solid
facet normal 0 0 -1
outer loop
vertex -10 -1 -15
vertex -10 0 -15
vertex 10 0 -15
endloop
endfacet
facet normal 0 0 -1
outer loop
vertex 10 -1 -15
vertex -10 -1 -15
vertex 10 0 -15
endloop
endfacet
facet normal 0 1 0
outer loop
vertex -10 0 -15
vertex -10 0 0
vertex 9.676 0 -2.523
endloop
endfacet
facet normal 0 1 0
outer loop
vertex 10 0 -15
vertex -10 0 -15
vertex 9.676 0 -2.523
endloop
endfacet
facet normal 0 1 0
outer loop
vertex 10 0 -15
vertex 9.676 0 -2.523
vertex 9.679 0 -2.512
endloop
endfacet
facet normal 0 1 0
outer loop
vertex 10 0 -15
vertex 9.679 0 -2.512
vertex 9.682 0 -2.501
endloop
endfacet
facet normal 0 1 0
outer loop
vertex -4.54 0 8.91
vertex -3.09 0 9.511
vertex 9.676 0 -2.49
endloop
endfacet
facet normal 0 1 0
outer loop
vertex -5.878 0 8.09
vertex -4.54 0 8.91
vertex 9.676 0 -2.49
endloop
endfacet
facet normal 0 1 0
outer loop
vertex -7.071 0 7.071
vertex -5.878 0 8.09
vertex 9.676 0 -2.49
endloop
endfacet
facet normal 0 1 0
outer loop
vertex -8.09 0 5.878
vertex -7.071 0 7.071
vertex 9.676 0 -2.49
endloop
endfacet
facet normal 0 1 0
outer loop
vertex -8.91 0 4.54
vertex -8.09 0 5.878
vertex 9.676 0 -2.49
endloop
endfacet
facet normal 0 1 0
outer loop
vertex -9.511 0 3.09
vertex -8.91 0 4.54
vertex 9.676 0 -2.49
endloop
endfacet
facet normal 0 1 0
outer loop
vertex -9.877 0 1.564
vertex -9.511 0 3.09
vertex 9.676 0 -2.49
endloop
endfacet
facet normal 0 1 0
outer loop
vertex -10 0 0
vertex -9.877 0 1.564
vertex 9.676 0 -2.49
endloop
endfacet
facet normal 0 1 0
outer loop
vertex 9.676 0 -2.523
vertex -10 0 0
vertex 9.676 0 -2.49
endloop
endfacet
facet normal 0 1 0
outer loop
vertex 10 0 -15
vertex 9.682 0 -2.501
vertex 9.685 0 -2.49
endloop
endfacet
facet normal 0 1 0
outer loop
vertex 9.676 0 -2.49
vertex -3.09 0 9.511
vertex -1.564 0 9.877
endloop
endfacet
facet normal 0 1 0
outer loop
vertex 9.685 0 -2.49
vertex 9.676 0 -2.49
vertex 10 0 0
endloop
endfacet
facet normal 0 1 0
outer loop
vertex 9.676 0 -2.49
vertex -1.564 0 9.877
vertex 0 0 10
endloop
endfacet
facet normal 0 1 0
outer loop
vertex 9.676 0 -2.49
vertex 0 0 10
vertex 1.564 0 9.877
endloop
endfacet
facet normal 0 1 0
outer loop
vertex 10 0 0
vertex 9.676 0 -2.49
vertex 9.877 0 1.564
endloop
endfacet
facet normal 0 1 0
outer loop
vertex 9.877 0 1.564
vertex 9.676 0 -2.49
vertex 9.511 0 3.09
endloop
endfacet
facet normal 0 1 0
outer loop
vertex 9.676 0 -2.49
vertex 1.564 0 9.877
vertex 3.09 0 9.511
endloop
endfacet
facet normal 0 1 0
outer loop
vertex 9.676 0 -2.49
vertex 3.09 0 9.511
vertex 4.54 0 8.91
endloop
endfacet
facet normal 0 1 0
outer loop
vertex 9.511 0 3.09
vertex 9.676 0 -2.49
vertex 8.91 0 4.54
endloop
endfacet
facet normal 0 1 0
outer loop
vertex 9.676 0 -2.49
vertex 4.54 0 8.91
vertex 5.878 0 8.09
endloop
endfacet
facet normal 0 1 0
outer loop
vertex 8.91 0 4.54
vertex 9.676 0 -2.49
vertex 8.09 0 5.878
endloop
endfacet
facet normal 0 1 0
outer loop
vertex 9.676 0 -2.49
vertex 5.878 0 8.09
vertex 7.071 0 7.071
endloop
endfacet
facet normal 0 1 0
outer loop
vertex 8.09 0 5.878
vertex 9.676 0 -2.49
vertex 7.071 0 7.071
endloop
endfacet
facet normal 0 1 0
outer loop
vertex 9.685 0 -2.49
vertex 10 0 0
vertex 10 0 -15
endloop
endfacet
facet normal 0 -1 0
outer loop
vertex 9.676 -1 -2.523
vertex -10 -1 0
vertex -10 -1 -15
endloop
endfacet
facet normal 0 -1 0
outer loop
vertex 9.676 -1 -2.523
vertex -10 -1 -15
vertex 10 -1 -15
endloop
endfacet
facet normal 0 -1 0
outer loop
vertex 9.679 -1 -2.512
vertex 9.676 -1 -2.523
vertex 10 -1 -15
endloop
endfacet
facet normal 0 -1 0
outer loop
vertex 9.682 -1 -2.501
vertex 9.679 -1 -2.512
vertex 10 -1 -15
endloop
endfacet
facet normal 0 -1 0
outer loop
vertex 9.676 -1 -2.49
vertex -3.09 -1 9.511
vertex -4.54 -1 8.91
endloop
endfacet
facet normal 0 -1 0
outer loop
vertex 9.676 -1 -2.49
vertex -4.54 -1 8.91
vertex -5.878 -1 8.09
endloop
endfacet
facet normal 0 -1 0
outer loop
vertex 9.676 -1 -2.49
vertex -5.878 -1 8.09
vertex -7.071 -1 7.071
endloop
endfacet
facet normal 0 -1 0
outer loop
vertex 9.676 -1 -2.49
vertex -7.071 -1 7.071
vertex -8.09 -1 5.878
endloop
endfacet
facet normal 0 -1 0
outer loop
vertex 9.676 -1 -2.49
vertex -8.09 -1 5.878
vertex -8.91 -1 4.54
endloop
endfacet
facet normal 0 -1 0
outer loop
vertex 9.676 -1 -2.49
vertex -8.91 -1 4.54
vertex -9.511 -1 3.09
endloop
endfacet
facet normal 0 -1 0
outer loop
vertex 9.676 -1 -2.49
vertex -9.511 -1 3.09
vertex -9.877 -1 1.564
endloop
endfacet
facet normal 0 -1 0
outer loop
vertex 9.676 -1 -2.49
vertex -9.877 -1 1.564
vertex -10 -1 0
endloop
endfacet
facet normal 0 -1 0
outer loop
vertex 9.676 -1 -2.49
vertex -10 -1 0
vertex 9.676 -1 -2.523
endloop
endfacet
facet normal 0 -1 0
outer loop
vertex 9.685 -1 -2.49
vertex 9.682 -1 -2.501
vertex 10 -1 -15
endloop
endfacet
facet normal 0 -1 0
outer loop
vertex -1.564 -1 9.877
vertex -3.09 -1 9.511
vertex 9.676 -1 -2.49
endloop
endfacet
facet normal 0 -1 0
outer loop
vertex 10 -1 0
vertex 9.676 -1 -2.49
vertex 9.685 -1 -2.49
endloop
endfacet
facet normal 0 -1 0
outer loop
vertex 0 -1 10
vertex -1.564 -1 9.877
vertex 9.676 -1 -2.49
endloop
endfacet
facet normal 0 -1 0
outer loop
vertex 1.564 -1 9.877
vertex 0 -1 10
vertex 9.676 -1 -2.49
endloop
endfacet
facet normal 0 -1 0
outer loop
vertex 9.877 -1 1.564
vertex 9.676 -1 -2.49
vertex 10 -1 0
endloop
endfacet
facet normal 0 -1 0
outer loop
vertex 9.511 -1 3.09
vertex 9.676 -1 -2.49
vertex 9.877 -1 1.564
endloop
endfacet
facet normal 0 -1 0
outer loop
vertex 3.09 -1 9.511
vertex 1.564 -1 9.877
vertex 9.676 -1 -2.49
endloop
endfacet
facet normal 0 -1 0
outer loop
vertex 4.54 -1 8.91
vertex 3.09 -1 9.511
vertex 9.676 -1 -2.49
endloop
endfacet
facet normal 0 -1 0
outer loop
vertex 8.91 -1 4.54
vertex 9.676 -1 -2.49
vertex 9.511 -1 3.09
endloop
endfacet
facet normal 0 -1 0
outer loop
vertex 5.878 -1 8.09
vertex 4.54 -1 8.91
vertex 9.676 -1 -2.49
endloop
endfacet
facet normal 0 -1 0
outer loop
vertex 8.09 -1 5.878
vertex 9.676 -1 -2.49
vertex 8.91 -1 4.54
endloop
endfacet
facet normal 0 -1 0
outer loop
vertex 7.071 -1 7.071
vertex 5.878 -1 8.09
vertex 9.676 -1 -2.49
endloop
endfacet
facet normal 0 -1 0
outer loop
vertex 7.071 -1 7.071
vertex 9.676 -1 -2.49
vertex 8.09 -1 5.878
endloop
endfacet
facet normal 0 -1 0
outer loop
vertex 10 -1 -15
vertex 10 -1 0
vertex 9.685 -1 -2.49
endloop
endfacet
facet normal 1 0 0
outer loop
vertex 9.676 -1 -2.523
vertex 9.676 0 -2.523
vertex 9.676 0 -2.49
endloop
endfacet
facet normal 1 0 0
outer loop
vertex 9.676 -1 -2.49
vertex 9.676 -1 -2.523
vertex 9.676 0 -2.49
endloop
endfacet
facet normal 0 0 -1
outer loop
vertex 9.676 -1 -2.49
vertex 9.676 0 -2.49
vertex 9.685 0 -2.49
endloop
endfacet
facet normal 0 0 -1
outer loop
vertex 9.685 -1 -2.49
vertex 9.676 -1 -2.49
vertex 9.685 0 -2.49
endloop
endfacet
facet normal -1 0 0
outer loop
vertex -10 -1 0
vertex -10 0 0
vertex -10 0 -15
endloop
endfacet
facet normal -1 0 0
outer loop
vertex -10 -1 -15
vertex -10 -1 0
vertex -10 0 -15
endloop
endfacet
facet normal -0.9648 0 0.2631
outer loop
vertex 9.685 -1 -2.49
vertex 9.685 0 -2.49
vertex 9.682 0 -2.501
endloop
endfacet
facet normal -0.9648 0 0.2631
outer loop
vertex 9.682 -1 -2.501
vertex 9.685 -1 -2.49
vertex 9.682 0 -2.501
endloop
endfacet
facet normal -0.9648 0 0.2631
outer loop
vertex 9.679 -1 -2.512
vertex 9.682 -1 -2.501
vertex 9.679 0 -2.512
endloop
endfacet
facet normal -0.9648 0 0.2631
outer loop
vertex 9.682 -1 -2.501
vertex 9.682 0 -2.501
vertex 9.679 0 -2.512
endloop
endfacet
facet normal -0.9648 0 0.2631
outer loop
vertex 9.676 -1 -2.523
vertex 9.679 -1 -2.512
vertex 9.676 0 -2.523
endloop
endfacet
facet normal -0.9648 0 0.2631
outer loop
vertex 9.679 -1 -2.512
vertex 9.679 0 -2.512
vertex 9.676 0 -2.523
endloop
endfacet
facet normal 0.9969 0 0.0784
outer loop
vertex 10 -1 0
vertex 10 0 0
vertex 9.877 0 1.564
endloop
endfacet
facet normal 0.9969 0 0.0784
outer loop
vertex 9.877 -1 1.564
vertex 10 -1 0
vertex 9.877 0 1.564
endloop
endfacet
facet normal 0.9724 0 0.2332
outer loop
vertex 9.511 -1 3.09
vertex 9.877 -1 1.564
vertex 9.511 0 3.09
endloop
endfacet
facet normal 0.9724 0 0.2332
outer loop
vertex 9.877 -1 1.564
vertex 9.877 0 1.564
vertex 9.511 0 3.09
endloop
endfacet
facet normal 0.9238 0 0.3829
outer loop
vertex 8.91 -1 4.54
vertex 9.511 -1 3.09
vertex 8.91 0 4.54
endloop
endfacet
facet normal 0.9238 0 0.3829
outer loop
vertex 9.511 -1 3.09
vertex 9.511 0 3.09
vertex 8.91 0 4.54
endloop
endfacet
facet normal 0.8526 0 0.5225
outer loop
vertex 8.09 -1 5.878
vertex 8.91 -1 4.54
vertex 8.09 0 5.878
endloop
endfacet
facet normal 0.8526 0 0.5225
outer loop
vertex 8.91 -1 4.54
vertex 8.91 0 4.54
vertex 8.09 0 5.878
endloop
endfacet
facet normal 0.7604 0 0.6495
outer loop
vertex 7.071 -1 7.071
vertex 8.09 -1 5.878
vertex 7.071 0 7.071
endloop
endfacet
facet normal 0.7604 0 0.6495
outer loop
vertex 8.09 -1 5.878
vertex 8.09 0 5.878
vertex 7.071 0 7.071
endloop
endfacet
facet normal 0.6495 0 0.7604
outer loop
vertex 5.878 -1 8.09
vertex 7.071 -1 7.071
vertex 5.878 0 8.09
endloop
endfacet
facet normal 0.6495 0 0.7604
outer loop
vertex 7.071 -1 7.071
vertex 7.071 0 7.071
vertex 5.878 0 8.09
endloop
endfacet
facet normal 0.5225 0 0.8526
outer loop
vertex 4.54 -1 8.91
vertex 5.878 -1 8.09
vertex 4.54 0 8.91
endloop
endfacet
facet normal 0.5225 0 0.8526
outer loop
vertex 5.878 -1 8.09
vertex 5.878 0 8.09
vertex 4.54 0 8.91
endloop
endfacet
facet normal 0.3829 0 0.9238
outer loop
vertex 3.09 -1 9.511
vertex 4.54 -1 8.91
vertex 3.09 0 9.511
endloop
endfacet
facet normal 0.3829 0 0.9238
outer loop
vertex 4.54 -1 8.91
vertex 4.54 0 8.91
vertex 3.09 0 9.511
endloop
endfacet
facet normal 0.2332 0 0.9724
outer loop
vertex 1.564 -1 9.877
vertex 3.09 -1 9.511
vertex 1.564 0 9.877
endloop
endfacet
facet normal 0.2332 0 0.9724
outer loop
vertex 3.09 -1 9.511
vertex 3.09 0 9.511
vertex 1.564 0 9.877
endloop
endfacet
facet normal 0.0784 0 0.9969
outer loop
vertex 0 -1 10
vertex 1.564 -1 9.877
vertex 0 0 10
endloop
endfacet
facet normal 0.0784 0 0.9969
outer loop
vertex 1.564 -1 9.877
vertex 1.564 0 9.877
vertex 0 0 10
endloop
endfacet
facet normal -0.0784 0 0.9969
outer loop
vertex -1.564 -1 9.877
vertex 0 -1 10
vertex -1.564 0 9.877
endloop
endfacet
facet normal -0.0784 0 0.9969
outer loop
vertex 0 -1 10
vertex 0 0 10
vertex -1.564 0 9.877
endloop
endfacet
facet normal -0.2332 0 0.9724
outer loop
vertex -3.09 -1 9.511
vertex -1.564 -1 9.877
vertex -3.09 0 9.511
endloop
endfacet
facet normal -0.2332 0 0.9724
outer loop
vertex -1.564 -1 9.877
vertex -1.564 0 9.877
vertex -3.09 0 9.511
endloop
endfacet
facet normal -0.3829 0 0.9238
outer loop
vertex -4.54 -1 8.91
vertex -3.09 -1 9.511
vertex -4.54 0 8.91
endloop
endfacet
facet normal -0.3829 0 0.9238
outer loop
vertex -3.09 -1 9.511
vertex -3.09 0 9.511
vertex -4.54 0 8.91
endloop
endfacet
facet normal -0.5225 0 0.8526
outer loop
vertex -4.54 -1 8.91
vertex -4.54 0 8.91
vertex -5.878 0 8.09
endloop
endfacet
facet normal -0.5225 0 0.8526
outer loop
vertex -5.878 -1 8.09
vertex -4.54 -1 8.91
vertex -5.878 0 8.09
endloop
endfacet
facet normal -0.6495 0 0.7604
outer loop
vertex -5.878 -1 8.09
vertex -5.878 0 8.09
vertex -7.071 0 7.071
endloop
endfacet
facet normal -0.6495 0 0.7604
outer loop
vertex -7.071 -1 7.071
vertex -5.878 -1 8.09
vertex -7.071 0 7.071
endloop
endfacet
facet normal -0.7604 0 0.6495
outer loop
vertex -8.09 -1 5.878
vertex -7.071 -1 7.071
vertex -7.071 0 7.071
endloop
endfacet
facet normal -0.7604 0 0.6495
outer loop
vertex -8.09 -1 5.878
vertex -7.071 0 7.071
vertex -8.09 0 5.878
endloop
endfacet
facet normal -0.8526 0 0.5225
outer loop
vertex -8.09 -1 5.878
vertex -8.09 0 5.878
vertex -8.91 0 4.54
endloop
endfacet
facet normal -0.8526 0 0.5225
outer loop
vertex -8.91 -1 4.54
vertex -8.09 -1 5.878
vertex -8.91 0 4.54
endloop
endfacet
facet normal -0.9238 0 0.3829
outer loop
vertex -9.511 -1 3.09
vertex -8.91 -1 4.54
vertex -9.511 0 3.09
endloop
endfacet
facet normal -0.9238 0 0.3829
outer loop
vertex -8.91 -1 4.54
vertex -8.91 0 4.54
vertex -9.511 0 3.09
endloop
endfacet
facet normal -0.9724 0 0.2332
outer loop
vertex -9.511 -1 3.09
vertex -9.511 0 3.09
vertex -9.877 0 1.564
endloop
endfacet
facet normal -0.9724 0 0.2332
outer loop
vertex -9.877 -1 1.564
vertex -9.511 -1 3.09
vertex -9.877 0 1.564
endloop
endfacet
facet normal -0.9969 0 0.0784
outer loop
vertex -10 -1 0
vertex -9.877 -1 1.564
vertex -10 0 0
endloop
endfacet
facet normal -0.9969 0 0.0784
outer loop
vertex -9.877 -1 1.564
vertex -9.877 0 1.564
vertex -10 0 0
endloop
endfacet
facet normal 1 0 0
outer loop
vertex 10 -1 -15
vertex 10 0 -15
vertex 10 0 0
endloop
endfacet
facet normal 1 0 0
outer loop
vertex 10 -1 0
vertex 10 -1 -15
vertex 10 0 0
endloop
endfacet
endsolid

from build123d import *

# Parameters (mm, degrees)
F1_DEPTH = 1


with BuildPart() as f1:
    # F0 (on Front) → F1 (new body)
    with BuildSketch(Plane.XZ):
        with BuildLine():
            Line((10, -15), (10, 0))
            ThreePointArc((10, 0), (0, 10), (-10, 0))
            Line((-10, 0), (-10, -15))
            Line((-10, -15), (10, -15))
        make_face()
        with BuildLine():
            ThreePointArc((9.684985, -2.490193), (9.680742, -2.506638), (9.676471, -2.523077))
            Line((9.676471, -2.523077), (9.676471, -2.490193))
            Line((9.676471, -2.490193), (9.684985, -2.490193))
        make_face(mode=Mode.SUBTRACT)
    extrude(amount=F1_DEPTH)


solid = f1.part
